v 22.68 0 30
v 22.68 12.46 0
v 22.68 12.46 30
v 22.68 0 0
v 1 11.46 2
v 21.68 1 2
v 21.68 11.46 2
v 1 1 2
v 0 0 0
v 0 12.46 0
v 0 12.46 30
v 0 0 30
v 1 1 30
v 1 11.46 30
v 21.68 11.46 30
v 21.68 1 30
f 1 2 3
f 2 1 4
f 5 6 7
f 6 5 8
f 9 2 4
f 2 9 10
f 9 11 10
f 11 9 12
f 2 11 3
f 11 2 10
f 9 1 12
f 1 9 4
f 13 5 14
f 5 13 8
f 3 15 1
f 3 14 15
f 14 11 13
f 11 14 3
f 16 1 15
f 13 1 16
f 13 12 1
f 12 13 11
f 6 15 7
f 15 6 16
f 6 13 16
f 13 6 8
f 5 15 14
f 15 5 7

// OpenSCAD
// Base dimensions (mm)
base_x = 20.38;
base_y = 10.16;
height = 30;        // 3 cm

// Parameters
wall = 1;           // wall thickness
floor = 2;          // bottom thickness
clearance = 0.3;    // tolerance for fitting

// Derived values
inner_x = base_x + clearance;
inner_y = base_y + clearance;

outer_x = inner_x + 2 * wall;
outer_y = inner_y + 2 * wall;

// Rendering resolution for circular geometry (higher = smoother)
$fn = 100;

// Model
union() {
    // bottom
    cube([outer_x, outer_y, floor], center = false);

    // walls
    // left
    translate([0, 0, 0])
        cube([wall, outer_y, height]);

    // right
    translate([outer_x - wall, 0, 0])
        cube([wall, outer_y, height]);

    // front
    translate([wall, 0, 0])
        cube([inner_x, wall, height]);

    // back
    translate([wall, outer_y - wall, 0])
        cube([inner_x, wall, height]);
}
